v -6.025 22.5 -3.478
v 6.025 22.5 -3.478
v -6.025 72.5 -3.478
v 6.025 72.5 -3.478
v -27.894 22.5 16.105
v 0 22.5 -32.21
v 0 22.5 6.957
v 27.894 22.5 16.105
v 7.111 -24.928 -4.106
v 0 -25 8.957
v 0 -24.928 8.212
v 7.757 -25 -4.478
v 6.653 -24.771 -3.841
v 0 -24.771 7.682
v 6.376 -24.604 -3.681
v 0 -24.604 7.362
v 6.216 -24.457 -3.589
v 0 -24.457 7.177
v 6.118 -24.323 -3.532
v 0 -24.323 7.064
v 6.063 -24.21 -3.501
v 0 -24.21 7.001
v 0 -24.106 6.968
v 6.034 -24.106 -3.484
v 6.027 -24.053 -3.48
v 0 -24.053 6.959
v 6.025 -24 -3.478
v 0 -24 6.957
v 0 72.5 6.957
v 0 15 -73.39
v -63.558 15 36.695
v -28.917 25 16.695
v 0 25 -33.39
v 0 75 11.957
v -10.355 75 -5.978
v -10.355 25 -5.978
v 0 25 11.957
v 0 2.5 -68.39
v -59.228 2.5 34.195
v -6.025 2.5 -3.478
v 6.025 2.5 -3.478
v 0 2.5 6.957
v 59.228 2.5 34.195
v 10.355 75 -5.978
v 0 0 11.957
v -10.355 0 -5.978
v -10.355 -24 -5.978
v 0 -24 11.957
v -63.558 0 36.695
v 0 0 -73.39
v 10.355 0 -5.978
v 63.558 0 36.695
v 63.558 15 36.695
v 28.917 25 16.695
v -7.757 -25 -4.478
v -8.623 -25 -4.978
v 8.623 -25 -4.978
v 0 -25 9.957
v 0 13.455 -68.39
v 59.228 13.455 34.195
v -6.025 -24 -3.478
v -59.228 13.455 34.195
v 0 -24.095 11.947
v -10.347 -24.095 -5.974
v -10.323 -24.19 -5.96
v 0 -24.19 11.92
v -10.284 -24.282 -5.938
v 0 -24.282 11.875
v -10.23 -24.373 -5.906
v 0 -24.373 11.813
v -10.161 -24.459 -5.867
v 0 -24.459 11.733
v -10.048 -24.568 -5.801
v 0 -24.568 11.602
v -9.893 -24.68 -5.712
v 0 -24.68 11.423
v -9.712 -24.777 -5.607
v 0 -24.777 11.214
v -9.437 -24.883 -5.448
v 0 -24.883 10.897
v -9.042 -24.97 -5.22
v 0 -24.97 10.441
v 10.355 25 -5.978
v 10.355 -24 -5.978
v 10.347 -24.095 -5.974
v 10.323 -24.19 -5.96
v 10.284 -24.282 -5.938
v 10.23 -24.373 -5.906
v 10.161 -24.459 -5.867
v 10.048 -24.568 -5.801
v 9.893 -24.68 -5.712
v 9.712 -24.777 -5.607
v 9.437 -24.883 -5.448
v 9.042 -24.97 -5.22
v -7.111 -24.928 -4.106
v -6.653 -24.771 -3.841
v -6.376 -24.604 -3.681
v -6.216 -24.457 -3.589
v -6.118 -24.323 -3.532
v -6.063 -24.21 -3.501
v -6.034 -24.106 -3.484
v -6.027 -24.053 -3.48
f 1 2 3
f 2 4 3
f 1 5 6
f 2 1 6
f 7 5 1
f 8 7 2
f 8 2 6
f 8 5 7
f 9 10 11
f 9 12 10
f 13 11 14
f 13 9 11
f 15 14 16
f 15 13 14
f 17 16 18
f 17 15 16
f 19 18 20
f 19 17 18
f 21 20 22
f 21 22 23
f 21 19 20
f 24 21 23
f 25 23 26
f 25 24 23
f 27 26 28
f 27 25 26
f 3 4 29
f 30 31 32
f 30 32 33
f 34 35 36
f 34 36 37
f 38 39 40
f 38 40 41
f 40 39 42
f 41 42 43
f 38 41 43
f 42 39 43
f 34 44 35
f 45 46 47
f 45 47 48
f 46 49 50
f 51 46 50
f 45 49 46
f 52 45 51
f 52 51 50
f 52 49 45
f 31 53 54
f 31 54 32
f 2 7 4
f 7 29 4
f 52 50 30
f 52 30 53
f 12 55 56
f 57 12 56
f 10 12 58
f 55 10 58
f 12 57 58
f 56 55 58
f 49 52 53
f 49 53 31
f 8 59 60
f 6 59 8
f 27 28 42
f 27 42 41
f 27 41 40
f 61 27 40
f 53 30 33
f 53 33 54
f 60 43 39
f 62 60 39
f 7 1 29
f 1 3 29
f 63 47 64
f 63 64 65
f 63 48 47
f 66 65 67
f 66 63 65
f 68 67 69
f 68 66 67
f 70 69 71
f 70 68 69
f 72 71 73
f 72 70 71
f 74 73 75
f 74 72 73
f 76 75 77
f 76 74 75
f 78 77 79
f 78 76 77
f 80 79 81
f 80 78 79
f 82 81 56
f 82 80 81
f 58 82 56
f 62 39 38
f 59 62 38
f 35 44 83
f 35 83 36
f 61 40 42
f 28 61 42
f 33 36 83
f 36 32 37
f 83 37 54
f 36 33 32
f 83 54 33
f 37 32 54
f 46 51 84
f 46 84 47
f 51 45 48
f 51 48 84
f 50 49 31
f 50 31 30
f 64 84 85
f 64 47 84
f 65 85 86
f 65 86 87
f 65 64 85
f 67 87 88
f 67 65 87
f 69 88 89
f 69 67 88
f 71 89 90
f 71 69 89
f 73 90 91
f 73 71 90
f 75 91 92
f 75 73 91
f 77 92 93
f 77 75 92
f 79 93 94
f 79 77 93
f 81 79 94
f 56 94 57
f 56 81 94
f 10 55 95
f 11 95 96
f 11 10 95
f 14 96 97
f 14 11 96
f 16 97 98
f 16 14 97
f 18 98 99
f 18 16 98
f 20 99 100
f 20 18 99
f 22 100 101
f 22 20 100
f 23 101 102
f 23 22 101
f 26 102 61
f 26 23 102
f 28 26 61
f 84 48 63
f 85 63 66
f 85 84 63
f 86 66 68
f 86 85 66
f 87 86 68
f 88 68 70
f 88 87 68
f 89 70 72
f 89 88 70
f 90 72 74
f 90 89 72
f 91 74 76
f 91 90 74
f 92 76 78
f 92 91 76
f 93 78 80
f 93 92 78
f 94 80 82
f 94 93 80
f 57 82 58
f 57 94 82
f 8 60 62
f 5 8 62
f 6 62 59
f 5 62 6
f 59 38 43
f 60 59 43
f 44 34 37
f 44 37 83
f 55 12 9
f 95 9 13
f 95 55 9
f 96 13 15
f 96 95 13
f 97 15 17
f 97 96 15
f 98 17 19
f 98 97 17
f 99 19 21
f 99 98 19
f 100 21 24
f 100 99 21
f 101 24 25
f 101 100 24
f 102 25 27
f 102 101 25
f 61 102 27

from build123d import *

# Parameters (mm, degrees)
F1_DEPTH = 25
F2_SIZE2 = 10
F2_SIZE  = 20
F4_DEPTH = 50
F5_T     = -2.5
F6_R     = 1


with BuildPart() as f1:
    # F0 (on Front) → F1 (new body)
    with BuildSketch(Plane.XZ):
        Polygon((63.5576491768, 36.6950258613), (-63.5576491768, 36.6950258613), (0, -73.3900517225), align=None)
    extrude(amount=-F1_DEPTH)

    # F2
    f2_edges = [f1.edges().sort_by_distance(p)[0] for p in [
        (-31.778825, 25, -18.347513),
        (0, 25, 36.695026),
        (31.778825, 25, -18.347513),
    ]]
    f2_side = f1.faces().sort_by_distance((0, 25, 0))[0]
    chamfer(f2_edges, length=F2_SIZE, length2=F2_SIZE2, reference=f2_side)

    # F3 (on face) → F4 (join, symmetric)
    with BuildSketch(Plane(origin=(0, 25, 0), x_dir=(-1, 0, 0), z_dir=(0, 1, 0))):
        Polygon((-10.3546479691, -5.9782587923), (10.3546479691, -5.9782587923), (0, 11.9565175846), align=None)
    extrude(amount=F4_DEPTH, both=True)

    # F5
    f5_openings = [f1.faces().sort_by_distance(p)[0] for p in [
        (0, -25, 0),
    ]]
    offset(amount=F5_T, openings=f5_openings, kind=Kind.INTERSECTION)

    # F6
    f6_edges = [f1.edges().sort_by_distance(p)[0] for p in [
        (0, -25, -5.978259),
        (0, -25, -3.478259),
        (3.01226, -25, 1.739129),
        (5.177324, -25, 2.989129),
        (-5.177324, -25, 2.989129),
        (-3.01226, -25, 1.739129),
    ]]
    fillet(f6_edges, radius=F6_R)


solid = f1.part
